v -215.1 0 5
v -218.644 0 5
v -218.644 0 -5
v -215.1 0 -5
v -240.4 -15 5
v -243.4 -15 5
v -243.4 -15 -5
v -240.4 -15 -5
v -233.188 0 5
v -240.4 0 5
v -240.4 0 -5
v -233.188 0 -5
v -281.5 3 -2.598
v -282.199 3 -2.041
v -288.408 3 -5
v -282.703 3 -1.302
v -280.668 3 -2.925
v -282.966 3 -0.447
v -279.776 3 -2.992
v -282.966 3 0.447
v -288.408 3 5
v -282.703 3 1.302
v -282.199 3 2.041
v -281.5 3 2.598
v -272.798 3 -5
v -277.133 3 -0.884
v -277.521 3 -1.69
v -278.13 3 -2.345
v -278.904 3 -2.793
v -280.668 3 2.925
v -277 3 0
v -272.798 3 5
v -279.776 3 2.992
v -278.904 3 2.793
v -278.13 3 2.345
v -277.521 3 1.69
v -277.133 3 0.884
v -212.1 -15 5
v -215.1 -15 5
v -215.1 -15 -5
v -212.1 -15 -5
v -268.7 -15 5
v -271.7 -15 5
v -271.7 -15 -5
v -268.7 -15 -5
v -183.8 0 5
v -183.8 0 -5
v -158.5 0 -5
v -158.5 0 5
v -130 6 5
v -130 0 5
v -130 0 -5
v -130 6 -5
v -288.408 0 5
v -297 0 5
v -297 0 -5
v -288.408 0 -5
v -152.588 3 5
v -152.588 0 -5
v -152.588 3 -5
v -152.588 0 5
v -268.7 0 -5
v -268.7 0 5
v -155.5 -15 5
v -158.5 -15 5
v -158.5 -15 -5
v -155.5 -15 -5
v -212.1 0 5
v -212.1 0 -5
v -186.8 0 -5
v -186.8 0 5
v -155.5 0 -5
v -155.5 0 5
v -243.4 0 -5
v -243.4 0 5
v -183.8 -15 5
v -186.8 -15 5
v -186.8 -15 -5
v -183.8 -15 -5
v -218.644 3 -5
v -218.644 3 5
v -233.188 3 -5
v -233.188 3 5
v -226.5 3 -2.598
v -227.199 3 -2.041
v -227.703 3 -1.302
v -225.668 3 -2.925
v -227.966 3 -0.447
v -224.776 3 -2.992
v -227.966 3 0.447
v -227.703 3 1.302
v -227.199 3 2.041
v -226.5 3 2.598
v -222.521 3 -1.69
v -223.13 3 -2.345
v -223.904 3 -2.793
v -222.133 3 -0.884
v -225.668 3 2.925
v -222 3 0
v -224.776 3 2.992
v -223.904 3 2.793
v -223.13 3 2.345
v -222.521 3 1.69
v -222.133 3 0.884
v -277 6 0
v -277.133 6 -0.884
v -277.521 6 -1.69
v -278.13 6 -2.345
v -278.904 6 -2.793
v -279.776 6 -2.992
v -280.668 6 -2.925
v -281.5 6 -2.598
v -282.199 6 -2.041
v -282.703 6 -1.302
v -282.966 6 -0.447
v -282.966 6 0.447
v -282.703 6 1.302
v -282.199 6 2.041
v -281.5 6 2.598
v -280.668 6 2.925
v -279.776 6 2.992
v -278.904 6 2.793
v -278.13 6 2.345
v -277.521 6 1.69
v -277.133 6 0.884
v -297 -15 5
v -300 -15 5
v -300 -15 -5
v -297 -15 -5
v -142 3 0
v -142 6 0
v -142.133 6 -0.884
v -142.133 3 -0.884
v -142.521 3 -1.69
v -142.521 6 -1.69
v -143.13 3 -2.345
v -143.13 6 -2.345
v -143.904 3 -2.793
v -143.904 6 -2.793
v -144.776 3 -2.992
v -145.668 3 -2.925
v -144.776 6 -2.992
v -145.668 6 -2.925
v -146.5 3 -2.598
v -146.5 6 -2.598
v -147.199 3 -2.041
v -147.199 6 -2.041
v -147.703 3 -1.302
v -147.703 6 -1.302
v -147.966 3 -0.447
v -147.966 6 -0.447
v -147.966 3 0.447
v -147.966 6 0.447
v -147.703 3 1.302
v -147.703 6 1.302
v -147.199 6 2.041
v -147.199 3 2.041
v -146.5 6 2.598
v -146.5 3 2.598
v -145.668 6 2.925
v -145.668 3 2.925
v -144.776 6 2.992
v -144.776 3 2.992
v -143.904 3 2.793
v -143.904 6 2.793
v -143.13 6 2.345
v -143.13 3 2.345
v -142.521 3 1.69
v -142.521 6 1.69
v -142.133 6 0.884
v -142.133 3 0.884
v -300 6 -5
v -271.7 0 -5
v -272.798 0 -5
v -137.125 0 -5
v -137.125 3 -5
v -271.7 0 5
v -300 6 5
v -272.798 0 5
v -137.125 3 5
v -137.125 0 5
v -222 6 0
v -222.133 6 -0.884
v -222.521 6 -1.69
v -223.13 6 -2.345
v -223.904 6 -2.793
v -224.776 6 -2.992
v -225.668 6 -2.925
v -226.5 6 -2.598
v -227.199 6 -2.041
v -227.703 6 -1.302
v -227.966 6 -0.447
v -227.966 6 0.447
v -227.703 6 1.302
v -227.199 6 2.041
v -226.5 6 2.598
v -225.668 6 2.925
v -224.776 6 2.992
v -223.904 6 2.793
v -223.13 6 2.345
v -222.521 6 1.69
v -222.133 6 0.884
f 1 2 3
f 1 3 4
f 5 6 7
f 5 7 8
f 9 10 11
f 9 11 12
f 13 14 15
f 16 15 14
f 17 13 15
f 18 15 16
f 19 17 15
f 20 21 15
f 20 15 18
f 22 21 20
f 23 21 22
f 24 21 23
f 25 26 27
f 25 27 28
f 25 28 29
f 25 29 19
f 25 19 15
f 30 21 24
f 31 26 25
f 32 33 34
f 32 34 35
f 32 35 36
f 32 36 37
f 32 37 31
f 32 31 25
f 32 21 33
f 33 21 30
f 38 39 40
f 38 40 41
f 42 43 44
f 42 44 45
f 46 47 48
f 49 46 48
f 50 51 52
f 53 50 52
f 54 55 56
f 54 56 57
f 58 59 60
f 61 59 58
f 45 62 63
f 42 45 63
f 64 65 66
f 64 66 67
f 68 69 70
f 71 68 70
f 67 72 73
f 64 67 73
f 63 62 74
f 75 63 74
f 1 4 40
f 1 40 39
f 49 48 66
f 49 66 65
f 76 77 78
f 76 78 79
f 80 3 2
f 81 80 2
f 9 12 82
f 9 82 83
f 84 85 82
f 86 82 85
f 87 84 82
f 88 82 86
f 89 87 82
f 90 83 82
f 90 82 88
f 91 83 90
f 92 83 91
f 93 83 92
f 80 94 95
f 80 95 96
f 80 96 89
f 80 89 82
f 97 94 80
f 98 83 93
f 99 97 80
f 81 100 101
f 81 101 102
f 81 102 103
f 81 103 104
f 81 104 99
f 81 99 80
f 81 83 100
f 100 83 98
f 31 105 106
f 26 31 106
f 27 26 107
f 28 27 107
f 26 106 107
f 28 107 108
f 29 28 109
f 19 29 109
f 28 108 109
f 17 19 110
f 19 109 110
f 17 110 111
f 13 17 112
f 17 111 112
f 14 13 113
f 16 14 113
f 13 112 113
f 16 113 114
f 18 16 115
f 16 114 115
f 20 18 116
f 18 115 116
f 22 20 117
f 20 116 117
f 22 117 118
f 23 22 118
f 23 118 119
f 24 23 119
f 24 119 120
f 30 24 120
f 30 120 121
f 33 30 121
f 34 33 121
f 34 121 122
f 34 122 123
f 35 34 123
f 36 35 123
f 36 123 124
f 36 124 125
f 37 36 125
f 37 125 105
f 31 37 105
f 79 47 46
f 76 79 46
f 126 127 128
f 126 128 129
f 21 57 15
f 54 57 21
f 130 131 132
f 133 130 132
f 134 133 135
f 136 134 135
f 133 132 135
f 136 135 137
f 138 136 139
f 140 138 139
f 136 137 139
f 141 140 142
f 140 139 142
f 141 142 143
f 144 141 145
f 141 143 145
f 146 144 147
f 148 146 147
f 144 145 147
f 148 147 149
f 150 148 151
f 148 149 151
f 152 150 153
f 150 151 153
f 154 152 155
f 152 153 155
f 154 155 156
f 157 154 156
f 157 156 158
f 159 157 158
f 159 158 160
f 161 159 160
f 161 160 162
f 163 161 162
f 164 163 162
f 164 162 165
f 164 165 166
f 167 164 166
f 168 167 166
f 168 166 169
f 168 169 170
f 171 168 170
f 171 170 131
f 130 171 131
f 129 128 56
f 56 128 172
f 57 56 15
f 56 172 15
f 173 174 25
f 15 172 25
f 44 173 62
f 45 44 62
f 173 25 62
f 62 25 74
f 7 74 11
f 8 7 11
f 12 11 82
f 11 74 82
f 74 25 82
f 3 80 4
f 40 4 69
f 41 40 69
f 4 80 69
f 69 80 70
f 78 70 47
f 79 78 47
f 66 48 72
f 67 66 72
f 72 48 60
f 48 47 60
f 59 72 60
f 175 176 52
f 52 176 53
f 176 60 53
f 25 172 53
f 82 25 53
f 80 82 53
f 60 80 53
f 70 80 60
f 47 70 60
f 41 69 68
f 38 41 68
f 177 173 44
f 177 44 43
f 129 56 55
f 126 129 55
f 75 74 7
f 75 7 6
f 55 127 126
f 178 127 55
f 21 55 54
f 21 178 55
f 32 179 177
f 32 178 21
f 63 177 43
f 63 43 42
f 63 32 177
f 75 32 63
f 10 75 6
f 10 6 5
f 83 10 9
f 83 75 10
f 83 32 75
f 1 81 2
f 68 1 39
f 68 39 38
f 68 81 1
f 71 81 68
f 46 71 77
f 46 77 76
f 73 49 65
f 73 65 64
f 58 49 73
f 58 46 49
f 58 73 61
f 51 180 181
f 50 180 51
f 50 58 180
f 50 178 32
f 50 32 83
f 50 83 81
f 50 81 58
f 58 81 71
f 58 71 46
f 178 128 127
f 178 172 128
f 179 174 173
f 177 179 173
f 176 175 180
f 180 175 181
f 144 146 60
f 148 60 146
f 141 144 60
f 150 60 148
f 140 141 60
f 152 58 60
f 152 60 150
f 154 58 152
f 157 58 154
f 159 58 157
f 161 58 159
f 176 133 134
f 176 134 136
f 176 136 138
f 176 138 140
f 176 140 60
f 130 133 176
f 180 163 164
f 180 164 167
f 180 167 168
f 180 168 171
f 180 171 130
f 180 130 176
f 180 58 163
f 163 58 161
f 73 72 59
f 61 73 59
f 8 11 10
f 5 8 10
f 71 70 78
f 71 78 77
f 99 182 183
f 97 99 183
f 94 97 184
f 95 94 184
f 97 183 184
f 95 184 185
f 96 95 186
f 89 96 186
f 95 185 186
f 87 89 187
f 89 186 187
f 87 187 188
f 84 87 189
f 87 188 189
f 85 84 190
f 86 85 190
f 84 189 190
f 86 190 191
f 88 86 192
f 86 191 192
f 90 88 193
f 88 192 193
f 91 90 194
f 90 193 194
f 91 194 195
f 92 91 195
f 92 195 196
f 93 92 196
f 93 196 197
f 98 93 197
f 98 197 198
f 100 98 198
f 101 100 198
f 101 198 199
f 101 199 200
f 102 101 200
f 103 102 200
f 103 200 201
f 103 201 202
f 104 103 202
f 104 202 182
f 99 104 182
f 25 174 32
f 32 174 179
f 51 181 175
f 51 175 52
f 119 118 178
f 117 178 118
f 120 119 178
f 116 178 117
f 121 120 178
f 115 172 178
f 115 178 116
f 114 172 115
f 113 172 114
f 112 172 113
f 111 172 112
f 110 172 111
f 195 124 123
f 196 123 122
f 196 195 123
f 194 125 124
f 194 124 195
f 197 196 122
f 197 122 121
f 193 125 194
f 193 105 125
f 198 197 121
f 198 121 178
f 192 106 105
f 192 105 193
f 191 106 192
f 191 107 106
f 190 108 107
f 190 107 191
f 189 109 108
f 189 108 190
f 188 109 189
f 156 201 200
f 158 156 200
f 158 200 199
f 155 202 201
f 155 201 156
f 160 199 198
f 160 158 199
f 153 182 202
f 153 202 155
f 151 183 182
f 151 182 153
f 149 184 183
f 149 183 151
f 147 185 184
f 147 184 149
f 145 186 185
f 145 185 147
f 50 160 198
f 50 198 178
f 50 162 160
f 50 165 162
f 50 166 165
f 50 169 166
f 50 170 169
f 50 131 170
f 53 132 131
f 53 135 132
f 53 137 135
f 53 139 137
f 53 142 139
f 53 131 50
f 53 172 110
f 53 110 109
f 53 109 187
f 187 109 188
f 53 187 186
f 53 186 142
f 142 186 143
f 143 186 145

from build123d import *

# Parameters (mm, degrees)
SKETCH1_W           = 170
SKETCH1_H           = 10
BOSS_EXTRUDE1_DEPTH = 6
SKETCH3_W           = 3
SKETCH3_H           = 10
BOSS_EXTRUDE2_DEPTH = 15
LPATTERN1_COUNT     = 6
LPATTERN1_PITCH     = 28.3
SKETCH5_R           = 3
SKETCH5_R_2         = 1.8
CUT_EXTRUDE1_DEPTH  = 10
SKETCH7_W           = 15.610569604
SKETCH7_H           = 29.423295864
SKETCH7_W_2         = 14.543842925
SKETCH7_H_2         = 20.261696827
SKETCH7_W_3         = 15.463066773
SKETCH7_H_3         = 26.876388592
CUT_EXTRUDE3_DEPTH  = 3


with BuildPart() as part:
    # Sketch1 → Boss-Extrude1 (new body)
    with BuildSketch(Plane(origin=(0, 0, 0), x_dir=(1, 0, 0), z_dir=(0, 1, 0))):
        with Locations((-215, 0)):
            Rectangle(SKETCH1_W, SKETCH1_H)
    extrude(amount=BOSS_EXTRUDE1_DEPTH)

    # Sketch3 → Boss-Extrude2 (add)
    with BuildSketch(Plane.XZ):
        with Locations((-298.5, 0)):
            Rectangle(SKETCH3_W, SKETCH3_H)
    boss_extrude2 = extrude(amount=BOSS_EXTRUDE2_DEPTH)

    # LPattern1: Boss-Extrude2 ×6
    with Locations(*[(i * LPATTERN1_PITCH, 0, 0) for i in range(1, LPATTERN1_COUNT)]):
        add(boss_extrude2)

    # Sketch5 → Cut-Extrude1 (cut)
    with BuildSketch(Plane(origin=(0, 6, 0), x_dir=(1, 0, 0), z_dir=(0, 1, 0))):
        with Locations((-225, 0)):
            Circle(SKETCH5_R)
        with Locations((225, 0)):
            Circle(SKETCH5_R_2)
        with Locations((165, 0)):
            Circle(SKETCH5_R_2)
        with Locations((-280, 0)):
            Circle(SKETCH5_R)
        with Locations((-145, 0)):
            Circle(SKETCH5_R)
    extrude(amount=-CUT_EXTRUDE1_DEPTH, mode=Mode.SUBTRACT)

    # Sketch7 → Cut-Extrude3 (cut)
    with BuildSketch(Plane.XZ):
        with Locations((-280.60295859, 0.084727736)):
            Rectangle(SKETCH7_W, SKETCH7_H)
        with Locations((-225.915608204, -0.229636086)):
            Rectangle(SKETCH7_W_2, SKETCH7_H_2)
        with Locations((-144.85630026, -0.160459025)):
            Rectangle(SKETCH7_W_3, SKETCH7_H_3)
    extrude(amount=-CUT_EXTRUDE3_DEPTH, mode=Mode.SUBTRACT)


solid = part.part
